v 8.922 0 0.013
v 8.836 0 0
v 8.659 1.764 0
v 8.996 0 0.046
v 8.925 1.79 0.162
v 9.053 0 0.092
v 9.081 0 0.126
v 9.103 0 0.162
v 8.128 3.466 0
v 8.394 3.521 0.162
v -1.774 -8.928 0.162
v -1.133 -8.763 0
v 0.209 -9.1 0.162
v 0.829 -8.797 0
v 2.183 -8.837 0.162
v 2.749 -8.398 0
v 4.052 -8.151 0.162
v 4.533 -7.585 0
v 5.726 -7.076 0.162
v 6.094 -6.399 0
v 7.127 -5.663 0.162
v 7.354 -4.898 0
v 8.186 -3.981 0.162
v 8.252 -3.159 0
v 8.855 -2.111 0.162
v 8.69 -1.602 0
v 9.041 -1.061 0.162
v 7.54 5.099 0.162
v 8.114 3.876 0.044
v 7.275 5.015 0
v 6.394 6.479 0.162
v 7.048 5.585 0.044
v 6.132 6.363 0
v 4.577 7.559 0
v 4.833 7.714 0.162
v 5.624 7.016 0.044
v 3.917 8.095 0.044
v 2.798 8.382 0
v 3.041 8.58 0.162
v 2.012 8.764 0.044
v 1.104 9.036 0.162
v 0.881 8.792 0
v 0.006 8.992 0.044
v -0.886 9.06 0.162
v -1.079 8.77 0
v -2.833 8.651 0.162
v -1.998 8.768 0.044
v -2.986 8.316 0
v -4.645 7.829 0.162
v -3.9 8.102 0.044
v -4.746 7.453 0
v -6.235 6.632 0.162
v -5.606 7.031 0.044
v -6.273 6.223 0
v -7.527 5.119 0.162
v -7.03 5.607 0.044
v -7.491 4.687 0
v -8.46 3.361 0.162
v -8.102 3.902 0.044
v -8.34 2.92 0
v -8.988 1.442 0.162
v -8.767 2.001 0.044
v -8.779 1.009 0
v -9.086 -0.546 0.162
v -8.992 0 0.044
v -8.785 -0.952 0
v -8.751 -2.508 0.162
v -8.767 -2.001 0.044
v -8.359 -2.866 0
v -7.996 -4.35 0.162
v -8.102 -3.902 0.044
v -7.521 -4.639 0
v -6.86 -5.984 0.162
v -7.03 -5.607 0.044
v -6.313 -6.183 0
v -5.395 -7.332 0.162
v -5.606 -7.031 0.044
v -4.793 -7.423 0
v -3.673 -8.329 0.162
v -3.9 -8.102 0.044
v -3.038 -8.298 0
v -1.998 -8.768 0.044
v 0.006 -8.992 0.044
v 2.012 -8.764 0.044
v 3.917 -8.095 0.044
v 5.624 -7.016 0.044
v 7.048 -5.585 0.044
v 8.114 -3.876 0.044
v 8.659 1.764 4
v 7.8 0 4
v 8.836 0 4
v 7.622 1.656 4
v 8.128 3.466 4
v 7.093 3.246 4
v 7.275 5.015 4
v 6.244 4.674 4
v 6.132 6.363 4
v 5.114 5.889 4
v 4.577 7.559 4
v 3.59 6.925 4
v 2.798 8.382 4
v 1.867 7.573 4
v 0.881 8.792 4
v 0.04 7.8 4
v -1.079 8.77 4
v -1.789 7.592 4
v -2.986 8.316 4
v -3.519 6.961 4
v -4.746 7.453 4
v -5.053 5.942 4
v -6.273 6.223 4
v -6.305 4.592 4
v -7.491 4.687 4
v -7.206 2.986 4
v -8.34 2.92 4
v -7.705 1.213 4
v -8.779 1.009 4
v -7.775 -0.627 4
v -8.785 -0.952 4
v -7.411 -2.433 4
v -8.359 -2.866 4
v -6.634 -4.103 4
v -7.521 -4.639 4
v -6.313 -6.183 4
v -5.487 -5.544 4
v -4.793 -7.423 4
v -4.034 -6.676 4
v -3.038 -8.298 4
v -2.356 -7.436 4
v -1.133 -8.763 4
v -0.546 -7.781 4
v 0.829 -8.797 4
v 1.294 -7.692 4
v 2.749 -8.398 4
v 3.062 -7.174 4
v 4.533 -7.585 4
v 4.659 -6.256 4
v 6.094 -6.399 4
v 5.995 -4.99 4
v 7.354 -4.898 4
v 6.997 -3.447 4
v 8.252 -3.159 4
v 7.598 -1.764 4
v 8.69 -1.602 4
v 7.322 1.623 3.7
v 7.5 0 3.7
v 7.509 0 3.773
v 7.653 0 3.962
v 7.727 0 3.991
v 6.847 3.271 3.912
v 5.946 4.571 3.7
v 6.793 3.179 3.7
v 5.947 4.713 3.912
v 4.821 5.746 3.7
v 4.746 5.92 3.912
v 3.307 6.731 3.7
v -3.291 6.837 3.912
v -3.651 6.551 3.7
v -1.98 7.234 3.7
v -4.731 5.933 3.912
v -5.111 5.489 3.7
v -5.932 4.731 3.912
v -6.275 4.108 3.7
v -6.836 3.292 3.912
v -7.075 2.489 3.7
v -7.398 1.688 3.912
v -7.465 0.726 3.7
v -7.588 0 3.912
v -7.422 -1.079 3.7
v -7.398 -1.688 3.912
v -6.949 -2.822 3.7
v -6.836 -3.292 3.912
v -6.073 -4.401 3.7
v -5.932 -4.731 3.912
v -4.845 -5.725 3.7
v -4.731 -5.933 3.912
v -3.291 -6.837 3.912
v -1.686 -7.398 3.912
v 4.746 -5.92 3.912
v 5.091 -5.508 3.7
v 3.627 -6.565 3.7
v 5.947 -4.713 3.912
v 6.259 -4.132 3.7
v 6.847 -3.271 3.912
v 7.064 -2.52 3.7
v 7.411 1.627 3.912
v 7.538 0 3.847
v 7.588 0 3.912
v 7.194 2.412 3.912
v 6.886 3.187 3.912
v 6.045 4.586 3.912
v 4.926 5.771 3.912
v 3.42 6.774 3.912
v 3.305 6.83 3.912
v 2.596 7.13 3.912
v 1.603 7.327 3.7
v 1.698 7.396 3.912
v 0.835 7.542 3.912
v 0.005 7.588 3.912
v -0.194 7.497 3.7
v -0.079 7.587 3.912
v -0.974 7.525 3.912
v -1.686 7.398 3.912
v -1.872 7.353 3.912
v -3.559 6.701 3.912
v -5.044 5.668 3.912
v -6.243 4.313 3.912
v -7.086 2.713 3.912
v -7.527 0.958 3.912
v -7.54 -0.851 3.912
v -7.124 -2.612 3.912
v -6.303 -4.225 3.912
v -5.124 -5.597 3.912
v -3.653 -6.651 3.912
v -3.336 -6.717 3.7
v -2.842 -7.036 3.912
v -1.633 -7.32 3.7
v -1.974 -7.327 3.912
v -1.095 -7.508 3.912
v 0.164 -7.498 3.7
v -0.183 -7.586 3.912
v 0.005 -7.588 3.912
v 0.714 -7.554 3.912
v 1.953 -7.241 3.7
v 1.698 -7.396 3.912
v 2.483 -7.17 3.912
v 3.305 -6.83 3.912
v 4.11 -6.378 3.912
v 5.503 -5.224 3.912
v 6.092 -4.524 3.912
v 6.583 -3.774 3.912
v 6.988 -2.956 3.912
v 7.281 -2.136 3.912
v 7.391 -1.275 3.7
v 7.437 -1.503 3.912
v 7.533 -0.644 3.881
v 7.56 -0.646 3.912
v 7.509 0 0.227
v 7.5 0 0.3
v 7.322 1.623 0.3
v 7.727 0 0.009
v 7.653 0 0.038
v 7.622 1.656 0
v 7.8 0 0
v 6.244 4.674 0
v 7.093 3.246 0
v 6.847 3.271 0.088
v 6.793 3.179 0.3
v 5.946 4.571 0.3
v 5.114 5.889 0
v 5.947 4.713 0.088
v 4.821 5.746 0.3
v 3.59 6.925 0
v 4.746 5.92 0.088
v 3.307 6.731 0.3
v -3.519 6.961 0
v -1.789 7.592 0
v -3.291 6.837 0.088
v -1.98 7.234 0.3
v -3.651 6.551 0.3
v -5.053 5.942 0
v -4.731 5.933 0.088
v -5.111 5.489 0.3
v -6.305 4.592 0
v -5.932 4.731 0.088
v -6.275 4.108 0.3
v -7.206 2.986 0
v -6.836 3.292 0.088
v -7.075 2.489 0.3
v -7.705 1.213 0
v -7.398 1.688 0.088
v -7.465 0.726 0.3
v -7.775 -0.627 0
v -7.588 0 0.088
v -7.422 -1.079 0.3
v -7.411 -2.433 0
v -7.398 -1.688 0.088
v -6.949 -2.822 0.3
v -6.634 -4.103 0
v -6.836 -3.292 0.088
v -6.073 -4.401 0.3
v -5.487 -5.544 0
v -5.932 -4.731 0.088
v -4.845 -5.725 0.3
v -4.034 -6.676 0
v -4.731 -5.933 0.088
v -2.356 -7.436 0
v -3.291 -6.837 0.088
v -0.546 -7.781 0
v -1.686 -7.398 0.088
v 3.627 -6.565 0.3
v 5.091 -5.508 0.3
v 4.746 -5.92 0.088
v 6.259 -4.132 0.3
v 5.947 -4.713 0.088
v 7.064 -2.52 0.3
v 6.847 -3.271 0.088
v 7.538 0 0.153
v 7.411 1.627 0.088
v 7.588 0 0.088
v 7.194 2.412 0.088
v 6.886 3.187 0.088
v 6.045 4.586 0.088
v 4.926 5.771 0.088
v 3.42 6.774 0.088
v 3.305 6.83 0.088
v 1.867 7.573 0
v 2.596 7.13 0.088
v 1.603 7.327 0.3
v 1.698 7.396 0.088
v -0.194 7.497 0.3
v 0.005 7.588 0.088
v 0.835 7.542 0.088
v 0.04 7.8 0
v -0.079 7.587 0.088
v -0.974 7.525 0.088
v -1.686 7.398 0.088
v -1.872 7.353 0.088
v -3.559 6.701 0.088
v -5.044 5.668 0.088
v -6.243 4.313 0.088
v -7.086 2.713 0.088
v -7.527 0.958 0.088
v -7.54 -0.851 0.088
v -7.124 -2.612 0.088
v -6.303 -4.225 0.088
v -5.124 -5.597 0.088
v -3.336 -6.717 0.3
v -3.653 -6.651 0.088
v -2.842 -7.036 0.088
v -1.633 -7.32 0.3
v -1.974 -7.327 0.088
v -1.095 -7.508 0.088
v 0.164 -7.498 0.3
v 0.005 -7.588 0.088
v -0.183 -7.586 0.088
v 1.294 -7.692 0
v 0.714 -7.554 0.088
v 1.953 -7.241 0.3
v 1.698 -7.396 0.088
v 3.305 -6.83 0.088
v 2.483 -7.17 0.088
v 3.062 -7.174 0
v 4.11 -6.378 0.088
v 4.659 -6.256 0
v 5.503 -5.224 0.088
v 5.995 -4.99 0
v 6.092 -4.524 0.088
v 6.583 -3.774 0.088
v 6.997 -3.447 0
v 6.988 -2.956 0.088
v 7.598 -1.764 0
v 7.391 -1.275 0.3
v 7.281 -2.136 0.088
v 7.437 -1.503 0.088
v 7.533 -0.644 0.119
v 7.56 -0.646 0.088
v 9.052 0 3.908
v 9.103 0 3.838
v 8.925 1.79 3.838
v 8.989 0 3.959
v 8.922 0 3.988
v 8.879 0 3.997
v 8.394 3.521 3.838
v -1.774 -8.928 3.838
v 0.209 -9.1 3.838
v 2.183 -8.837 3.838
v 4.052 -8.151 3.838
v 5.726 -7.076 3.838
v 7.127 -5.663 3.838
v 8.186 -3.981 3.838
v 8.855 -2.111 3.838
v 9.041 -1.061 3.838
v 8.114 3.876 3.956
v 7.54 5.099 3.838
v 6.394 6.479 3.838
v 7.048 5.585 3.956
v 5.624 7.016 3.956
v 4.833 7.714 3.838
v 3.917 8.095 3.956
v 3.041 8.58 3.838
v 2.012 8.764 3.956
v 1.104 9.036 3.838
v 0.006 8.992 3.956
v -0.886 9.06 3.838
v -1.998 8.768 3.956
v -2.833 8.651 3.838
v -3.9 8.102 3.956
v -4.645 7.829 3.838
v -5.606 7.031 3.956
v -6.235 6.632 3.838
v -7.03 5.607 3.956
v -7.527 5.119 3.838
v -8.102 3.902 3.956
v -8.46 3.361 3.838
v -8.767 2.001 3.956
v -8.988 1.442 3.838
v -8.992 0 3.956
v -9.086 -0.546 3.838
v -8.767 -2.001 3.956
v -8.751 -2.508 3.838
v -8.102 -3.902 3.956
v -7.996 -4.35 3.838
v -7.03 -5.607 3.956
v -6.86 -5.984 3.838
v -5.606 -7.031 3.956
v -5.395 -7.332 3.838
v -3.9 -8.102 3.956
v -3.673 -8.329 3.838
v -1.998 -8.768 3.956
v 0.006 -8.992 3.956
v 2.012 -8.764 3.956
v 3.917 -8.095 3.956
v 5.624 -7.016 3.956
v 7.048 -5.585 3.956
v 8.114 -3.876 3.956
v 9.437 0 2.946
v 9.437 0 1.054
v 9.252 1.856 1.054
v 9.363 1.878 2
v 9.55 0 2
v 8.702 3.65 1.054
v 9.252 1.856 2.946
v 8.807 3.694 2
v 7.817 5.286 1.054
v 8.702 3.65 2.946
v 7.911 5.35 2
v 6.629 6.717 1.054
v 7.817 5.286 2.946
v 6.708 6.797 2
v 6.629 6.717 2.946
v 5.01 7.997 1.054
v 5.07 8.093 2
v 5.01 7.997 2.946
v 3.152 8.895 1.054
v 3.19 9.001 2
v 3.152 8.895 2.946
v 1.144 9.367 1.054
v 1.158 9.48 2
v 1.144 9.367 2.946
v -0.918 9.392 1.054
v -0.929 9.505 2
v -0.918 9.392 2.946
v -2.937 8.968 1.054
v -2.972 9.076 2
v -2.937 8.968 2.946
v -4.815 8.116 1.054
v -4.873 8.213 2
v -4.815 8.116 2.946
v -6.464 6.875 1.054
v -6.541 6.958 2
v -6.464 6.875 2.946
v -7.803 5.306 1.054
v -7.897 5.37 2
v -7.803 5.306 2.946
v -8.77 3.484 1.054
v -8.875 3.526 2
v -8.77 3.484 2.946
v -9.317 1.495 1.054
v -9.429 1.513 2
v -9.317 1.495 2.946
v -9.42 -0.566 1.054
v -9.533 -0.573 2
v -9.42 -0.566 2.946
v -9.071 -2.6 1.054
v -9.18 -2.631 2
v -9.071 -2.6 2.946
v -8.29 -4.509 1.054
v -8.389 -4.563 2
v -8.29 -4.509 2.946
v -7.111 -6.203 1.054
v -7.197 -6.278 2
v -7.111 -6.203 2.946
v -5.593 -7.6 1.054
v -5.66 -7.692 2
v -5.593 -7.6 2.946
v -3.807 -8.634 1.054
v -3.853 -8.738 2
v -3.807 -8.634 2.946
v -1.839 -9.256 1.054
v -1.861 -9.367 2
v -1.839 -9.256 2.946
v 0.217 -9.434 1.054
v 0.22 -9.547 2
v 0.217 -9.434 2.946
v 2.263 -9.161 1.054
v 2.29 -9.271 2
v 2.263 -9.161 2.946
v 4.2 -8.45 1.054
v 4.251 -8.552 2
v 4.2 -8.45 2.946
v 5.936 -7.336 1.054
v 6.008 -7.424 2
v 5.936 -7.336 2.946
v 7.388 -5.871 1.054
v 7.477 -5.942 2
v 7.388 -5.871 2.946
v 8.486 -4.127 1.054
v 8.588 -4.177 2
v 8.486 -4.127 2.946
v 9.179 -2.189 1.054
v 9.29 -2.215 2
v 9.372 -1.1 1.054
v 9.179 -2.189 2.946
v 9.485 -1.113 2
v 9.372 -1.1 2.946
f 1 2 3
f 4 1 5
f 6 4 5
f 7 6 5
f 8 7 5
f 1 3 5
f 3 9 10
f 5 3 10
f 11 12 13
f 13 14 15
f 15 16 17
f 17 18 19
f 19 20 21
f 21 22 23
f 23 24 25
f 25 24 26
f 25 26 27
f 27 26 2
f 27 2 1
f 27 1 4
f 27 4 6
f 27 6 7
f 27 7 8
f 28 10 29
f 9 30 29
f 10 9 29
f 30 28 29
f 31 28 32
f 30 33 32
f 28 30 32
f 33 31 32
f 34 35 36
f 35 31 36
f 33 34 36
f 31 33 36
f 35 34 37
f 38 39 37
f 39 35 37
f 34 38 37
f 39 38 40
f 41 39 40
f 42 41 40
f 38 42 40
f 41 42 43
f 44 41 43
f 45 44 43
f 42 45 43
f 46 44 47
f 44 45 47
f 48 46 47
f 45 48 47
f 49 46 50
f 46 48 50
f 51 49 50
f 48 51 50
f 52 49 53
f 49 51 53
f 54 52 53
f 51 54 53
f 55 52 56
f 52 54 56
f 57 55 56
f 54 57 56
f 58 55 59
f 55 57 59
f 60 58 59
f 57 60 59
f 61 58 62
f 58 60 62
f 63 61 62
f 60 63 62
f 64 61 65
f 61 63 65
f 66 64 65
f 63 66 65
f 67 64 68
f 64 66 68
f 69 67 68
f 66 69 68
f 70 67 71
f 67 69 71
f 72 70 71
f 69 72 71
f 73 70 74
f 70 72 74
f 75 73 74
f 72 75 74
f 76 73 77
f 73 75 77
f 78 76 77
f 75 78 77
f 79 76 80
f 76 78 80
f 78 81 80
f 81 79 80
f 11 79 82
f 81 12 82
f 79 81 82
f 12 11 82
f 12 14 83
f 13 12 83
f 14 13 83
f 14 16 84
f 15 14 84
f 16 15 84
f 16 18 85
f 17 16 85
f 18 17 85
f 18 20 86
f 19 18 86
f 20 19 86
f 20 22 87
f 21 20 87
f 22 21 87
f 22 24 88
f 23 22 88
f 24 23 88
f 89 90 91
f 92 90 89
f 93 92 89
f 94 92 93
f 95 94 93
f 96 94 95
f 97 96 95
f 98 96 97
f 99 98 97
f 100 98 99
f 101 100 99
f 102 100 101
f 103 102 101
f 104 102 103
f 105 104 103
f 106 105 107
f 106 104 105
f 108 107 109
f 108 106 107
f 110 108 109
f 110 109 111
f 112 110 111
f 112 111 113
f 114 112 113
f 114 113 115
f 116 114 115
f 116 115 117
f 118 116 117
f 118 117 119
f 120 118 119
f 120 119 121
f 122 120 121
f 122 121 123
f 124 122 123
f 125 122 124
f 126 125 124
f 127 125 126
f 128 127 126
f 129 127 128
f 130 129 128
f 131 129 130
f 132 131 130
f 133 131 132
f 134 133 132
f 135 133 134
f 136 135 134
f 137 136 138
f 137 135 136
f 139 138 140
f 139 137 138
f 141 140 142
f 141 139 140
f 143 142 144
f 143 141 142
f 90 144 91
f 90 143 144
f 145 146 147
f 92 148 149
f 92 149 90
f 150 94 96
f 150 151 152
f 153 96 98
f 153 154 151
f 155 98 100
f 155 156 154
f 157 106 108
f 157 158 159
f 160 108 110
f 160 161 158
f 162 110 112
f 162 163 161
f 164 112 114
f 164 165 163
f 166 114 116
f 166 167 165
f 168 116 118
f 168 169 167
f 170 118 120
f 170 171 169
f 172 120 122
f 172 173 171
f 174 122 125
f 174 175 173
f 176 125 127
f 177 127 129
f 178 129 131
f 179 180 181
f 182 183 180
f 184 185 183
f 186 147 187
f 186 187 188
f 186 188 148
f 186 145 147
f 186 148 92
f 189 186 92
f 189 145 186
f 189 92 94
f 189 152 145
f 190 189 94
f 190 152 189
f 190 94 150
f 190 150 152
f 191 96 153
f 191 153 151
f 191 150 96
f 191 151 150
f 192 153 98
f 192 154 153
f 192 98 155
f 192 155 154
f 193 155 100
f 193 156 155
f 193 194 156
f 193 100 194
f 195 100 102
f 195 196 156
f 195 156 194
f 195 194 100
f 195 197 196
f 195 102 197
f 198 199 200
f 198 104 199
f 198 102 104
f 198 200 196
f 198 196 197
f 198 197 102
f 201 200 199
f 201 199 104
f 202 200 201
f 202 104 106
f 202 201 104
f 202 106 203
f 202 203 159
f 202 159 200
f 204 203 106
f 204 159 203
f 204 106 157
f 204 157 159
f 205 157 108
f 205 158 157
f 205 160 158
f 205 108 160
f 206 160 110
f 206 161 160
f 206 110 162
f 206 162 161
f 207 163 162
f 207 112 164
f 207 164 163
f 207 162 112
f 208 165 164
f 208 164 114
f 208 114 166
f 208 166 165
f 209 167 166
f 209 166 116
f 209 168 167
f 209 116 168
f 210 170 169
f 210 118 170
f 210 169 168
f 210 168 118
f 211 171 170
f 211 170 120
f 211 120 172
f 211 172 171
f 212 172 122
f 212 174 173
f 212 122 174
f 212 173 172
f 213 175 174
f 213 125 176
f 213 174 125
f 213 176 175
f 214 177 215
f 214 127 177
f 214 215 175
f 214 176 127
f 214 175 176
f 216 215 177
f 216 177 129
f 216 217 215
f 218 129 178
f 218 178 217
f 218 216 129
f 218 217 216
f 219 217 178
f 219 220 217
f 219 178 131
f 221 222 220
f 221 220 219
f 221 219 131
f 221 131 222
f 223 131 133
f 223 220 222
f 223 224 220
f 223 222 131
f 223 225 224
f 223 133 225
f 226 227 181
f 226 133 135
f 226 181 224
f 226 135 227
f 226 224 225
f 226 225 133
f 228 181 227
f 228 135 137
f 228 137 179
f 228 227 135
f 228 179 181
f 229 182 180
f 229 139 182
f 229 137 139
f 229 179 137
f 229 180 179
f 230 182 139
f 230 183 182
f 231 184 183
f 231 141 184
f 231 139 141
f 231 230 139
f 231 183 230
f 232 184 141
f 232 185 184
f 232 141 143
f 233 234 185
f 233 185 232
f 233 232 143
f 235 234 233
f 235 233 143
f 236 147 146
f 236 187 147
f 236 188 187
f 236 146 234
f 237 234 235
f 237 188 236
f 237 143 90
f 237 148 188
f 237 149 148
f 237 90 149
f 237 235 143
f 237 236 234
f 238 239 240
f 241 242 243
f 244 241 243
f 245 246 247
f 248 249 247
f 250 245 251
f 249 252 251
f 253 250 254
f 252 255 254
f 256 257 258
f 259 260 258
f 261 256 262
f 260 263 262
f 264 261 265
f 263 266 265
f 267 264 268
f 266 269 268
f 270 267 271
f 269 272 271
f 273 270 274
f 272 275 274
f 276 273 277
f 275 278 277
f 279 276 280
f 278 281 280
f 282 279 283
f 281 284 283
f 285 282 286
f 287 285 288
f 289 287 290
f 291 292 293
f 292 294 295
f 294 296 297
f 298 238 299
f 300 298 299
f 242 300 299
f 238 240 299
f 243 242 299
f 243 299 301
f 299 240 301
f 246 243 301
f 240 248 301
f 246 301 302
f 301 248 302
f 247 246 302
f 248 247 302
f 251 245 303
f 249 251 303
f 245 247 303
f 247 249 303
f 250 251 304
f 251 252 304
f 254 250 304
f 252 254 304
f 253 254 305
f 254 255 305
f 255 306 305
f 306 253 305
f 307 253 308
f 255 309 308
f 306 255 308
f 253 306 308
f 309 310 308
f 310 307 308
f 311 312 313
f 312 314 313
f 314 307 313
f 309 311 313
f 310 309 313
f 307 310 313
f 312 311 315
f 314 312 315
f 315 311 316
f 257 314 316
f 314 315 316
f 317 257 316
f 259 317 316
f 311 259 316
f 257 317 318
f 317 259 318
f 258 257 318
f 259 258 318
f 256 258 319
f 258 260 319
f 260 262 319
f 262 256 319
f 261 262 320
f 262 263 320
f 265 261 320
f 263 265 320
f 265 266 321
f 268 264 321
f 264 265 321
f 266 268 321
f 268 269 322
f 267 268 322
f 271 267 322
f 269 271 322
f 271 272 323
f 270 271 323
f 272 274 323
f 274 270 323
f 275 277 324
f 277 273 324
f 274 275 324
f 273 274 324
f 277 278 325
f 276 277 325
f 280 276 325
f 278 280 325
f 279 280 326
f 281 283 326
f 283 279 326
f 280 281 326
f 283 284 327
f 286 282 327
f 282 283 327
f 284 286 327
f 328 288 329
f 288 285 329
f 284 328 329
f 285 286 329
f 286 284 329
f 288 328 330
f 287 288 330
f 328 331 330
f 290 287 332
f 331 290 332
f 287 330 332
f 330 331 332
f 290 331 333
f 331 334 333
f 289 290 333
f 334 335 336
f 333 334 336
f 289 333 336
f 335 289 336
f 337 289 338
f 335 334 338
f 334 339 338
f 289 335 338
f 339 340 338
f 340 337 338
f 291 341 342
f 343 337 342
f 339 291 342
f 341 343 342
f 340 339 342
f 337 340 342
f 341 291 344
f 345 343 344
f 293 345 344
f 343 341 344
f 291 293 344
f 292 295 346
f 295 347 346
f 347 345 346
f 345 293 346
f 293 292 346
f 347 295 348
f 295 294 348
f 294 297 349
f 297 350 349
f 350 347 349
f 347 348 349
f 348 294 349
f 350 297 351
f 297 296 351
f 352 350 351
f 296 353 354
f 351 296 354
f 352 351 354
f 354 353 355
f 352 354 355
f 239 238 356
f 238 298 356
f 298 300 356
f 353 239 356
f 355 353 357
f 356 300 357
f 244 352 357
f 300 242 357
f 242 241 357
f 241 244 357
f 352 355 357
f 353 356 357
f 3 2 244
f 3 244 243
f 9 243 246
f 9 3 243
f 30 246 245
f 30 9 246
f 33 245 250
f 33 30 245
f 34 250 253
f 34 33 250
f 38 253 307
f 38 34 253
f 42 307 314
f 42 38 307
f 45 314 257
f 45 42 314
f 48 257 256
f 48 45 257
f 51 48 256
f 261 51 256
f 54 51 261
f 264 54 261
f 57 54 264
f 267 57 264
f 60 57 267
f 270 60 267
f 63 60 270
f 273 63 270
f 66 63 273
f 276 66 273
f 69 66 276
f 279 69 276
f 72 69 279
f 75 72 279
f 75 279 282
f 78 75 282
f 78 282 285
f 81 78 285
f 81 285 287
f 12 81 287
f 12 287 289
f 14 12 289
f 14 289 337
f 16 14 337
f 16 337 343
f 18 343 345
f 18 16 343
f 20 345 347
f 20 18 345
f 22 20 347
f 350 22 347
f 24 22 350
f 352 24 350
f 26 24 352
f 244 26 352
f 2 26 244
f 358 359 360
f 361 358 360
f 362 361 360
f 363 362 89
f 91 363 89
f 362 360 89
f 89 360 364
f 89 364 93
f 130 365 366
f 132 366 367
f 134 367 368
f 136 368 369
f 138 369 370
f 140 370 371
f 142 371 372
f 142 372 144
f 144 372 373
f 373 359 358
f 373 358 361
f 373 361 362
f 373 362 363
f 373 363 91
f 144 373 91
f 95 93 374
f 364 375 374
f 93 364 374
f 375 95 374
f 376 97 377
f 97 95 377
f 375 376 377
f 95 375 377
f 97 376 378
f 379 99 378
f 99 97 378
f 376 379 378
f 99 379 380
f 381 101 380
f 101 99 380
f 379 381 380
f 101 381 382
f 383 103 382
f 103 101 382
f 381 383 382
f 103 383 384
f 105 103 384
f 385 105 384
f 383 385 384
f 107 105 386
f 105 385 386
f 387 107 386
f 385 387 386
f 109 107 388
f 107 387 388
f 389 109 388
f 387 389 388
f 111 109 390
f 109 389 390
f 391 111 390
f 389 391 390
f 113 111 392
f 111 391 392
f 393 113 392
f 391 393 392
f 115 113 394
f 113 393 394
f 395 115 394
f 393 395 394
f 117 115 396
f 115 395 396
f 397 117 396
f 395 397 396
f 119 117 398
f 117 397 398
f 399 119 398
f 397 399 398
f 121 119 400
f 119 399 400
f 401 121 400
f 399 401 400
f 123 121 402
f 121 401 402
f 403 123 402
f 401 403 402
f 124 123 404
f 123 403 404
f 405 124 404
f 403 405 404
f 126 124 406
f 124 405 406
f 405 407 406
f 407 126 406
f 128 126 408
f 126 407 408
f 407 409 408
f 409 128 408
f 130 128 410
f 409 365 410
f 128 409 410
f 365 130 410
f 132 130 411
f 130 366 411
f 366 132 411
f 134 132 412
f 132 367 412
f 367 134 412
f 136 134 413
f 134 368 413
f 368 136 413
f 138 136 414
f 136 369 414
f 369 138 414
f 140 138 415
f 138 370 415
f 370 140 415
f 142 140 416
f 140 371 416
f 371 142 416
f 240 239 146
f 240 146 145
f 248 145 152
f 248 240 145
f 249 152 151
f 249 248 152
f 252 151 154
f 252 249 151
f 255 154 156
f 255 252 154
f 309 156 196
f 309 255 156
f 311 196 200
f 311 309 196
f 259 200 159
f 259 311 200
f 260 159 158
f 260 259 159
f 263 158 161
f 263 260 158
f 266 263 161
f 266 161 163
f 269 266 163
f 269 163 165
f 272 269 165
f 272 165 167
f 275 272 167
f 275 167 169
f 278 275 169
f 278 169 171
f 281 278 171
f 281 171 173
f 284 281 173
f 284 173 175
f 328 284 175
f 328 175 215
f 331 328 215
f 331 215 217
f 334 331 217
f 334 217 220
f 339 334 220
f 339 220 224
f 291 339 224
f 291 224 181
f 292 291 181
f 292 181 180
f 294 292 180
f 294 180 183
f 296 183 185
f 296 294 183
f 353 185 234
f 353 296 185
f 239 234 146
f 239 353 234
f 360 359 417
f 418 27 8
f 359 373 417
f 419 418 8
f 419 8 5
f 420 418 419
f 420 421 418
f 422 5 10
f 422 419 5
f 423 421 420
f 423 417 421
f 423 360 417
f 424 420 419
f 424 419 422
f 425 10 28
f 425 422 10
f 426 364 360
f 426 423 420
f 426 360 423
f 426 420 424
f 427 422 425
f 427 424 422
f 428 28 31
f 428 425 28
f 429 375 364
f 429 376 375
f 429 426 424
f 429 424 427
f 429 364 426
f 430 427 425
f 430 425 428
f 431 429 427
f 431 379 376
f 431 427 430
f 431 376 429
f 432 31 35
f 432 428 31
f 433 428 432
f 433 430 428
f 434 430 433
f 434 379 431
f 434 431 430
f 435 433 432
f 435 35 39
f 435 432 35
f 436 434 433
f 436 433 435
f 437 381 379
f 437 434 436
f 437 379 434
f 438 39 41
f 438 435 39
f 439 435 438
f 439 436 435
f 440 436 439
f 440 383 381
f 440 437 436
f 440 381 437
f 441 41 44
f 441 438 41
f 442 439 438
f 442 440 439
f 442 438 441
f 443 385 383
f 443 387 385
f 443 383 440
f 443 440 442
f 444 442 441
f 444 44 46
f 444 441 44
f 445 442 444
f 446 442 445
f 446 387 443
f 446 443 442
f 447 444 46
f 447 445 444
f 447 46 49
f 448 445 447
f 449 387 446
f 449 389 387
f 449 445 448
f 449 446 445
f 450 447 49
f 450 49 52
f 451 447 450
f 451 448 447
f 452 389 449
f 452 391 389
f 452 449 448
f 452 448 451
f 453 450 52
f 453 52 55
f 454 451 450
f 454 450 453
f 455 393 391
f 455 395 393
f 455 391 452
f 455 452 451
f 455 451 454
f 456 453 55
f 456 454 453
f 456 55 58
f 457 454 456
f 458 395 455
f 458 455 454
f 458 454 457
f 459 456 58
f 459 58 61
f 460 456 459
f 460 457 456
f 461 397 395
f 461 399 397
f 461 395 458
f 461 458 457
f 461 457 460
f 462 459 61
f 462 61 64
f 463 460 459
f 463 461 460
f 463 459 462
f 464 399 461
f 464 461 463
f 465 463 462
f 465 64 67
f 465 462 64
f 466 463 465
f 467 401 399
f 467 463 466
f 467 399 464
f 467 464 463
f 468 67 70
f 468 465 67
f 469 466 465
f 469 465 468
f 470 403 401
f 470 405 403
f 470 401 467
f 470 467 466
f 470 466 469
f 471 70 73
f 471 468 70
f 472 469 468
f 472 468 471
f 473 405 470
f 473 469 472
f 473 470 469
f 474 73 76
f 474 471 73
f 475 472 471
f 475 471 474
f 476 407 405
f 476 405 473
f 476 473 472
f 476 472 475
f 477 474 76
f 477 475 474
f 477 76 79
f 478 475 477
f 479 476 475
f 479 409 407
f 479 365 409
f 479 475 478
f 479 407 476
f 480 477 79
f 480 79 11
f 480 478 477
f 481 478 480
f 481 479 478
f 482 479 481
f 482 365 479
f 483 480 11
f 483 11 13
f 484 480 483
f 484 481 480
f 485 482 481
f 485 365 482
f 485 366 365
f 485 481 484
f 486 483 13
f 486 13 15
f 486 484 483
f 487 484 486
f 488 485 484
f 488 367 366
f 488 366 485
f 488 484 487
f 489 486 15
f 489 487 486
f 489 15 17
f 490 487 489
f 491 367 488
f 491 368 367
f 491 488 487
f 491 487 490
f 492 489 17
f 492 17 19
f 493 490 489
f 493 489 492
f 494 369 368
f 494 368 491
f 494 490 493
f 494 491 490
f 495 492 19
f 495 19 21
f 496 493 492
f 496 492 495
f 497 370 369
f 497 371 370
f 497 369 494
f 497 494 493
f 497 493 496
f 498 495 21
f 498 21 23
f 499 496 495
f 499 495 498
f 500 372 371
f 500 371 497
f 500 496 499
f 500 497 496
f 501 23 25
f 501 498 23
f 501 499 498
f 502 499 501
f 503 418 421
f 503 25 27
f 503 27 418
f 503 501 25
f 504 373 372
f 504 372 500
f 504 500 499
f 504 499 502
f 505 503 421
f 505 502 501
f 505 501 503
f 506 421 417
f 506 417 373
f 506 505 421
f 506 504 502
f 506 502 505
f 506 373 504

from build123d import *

# Parameters (mm, degrees)
F3_R = 0.3


with BuildPart() as f2:
    # F2: sweep along a path in F0
    with BuildLine(Plane.XY) as f2_path:
        CenterArc((0, 0), 7.5, 0, 360)
    # F1 (on Front) → F2 (sweep)
    with BuildSketch(Plane.XZ):
        with BuildLine():
            Line((7.5, 4), (7.5, 0))
            Line((7.5, 0), (9.0141, 0))
            ThreePointArc((9.0141, 0), (9.5499983849, 2), (9.0141, 4))
            Line((9.0141, 4), (7.5, 4))
        make_face()
    sweep(path=f2_path.line)

    # F3
    f3_edges = [f2.edges().sort_by_distance(p)[0] for p in [
        (-7.5, 0, 4),
        (-7.5, 0, 0),
        (-9.0141, 0, 4),
        (-9.0141, 0, 0),
    ]]
    fillet(f3_edges, radius=F3_R)


solid = f2.part
